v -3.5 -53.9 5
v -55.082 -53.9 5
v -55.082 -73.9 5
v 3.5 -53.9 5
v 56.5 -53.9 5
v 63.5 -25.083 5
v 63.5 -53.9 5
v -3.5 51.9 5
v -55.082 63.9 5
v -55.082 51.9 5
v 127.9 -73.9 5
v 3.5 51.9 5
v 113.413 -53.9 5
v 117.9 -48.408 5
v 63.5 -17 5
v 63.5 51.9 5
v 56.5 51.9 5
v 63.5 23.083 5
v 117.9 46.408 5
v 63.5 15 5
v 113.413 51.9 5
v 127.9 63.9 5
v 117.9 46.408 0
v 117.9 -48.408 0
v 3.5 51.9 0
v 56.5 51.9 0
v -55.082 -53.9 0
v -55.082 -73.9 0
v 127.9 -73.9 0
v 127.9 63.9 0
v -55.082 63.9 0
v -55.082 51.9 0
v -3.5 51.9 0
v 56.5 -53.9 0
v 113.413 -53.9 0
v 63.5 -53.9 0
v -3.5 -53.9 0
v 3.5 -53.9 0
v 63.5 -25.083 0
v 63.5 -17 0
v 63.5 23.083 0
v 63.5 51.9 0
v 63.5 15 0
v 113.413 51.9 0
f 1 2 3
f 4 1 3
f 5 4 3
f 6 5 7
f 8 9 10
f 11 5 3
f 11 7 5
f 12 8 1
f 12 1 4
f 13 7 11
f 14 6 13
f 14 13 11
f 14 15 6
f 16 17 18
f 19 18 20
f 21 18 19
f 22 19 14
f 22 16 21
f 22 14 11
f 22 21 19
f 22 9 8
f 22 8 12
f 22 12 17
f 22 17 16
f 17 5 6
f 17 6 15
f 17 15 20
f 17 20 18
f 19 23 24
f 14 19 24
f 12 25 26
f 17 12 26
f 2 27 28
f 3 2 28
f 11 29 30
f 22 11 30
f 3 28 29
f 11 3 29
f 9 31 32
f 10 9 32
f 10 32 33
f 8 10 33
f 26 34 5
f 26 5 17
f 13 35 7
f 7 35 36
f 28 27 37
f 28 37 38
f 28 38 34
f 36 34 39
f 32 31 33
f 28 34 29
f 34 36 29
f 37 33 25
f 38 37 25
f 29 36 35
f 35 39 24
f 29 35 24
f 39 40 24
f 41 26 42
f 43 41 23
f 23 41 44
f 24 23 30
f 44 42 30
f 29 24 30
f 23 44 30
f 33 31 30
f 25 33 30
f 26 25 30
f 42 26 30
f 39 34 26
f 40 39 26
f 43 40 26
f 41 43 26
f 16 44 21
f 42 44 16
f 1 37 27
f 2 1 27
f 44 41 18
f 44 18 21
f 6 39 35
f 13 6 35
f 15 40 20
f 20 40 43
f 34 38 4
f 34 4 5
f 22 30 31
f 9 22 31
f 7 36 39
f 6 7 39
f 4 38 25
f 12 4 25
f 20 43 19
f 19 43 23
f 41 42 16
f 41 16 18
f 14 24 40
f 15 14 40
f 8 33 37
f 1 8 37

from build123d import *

# Parameters (mm, degrees)
SKETCH1_W           = 53
SKETCH1_H           = 105.8
BOSS_EXTRUDE1_DEPTH = 5


with BuildPart() as part:
    # Sketch1 → Boss-Extrude1 (new body)
    with BuildSketch(Plane.XY):
        Polygon((127.9, 63.9), (-55.082401894, 63.9), (-55.082401894, 51.9), (-3.5, 51.9), (-3.5, -53.9), (-55.082401894, -53.9), (-55.082401894, -73.9), (127.9, -73.9), (127.9, 51.9), align=None)
        with Locations((30, -1)):
            Rectangle(SKETCH1_W, SKETCH1_H, mode=Mode.SUBTRACT)
        Polygon((113.412674799, 51.9), (63.5, 51.9), (63.5, 23.082903769), align=None, mode=Mode.SUBTRACT)
        Polygon((113.412674799, -53.9), (63.5, -53.9), (63.5, -25.082903769), align=None, mode=Mode.SUBTRACT)
        Polygon((117.9, 46.407854644), (117.9, -48.407854644), (63.5, -17), (63.5, 15), align=None, mode=Mode.SUBTRACT)
    extrude(amount=BOSS_EXTRUDE1_DEPTH)


solid = part.part
